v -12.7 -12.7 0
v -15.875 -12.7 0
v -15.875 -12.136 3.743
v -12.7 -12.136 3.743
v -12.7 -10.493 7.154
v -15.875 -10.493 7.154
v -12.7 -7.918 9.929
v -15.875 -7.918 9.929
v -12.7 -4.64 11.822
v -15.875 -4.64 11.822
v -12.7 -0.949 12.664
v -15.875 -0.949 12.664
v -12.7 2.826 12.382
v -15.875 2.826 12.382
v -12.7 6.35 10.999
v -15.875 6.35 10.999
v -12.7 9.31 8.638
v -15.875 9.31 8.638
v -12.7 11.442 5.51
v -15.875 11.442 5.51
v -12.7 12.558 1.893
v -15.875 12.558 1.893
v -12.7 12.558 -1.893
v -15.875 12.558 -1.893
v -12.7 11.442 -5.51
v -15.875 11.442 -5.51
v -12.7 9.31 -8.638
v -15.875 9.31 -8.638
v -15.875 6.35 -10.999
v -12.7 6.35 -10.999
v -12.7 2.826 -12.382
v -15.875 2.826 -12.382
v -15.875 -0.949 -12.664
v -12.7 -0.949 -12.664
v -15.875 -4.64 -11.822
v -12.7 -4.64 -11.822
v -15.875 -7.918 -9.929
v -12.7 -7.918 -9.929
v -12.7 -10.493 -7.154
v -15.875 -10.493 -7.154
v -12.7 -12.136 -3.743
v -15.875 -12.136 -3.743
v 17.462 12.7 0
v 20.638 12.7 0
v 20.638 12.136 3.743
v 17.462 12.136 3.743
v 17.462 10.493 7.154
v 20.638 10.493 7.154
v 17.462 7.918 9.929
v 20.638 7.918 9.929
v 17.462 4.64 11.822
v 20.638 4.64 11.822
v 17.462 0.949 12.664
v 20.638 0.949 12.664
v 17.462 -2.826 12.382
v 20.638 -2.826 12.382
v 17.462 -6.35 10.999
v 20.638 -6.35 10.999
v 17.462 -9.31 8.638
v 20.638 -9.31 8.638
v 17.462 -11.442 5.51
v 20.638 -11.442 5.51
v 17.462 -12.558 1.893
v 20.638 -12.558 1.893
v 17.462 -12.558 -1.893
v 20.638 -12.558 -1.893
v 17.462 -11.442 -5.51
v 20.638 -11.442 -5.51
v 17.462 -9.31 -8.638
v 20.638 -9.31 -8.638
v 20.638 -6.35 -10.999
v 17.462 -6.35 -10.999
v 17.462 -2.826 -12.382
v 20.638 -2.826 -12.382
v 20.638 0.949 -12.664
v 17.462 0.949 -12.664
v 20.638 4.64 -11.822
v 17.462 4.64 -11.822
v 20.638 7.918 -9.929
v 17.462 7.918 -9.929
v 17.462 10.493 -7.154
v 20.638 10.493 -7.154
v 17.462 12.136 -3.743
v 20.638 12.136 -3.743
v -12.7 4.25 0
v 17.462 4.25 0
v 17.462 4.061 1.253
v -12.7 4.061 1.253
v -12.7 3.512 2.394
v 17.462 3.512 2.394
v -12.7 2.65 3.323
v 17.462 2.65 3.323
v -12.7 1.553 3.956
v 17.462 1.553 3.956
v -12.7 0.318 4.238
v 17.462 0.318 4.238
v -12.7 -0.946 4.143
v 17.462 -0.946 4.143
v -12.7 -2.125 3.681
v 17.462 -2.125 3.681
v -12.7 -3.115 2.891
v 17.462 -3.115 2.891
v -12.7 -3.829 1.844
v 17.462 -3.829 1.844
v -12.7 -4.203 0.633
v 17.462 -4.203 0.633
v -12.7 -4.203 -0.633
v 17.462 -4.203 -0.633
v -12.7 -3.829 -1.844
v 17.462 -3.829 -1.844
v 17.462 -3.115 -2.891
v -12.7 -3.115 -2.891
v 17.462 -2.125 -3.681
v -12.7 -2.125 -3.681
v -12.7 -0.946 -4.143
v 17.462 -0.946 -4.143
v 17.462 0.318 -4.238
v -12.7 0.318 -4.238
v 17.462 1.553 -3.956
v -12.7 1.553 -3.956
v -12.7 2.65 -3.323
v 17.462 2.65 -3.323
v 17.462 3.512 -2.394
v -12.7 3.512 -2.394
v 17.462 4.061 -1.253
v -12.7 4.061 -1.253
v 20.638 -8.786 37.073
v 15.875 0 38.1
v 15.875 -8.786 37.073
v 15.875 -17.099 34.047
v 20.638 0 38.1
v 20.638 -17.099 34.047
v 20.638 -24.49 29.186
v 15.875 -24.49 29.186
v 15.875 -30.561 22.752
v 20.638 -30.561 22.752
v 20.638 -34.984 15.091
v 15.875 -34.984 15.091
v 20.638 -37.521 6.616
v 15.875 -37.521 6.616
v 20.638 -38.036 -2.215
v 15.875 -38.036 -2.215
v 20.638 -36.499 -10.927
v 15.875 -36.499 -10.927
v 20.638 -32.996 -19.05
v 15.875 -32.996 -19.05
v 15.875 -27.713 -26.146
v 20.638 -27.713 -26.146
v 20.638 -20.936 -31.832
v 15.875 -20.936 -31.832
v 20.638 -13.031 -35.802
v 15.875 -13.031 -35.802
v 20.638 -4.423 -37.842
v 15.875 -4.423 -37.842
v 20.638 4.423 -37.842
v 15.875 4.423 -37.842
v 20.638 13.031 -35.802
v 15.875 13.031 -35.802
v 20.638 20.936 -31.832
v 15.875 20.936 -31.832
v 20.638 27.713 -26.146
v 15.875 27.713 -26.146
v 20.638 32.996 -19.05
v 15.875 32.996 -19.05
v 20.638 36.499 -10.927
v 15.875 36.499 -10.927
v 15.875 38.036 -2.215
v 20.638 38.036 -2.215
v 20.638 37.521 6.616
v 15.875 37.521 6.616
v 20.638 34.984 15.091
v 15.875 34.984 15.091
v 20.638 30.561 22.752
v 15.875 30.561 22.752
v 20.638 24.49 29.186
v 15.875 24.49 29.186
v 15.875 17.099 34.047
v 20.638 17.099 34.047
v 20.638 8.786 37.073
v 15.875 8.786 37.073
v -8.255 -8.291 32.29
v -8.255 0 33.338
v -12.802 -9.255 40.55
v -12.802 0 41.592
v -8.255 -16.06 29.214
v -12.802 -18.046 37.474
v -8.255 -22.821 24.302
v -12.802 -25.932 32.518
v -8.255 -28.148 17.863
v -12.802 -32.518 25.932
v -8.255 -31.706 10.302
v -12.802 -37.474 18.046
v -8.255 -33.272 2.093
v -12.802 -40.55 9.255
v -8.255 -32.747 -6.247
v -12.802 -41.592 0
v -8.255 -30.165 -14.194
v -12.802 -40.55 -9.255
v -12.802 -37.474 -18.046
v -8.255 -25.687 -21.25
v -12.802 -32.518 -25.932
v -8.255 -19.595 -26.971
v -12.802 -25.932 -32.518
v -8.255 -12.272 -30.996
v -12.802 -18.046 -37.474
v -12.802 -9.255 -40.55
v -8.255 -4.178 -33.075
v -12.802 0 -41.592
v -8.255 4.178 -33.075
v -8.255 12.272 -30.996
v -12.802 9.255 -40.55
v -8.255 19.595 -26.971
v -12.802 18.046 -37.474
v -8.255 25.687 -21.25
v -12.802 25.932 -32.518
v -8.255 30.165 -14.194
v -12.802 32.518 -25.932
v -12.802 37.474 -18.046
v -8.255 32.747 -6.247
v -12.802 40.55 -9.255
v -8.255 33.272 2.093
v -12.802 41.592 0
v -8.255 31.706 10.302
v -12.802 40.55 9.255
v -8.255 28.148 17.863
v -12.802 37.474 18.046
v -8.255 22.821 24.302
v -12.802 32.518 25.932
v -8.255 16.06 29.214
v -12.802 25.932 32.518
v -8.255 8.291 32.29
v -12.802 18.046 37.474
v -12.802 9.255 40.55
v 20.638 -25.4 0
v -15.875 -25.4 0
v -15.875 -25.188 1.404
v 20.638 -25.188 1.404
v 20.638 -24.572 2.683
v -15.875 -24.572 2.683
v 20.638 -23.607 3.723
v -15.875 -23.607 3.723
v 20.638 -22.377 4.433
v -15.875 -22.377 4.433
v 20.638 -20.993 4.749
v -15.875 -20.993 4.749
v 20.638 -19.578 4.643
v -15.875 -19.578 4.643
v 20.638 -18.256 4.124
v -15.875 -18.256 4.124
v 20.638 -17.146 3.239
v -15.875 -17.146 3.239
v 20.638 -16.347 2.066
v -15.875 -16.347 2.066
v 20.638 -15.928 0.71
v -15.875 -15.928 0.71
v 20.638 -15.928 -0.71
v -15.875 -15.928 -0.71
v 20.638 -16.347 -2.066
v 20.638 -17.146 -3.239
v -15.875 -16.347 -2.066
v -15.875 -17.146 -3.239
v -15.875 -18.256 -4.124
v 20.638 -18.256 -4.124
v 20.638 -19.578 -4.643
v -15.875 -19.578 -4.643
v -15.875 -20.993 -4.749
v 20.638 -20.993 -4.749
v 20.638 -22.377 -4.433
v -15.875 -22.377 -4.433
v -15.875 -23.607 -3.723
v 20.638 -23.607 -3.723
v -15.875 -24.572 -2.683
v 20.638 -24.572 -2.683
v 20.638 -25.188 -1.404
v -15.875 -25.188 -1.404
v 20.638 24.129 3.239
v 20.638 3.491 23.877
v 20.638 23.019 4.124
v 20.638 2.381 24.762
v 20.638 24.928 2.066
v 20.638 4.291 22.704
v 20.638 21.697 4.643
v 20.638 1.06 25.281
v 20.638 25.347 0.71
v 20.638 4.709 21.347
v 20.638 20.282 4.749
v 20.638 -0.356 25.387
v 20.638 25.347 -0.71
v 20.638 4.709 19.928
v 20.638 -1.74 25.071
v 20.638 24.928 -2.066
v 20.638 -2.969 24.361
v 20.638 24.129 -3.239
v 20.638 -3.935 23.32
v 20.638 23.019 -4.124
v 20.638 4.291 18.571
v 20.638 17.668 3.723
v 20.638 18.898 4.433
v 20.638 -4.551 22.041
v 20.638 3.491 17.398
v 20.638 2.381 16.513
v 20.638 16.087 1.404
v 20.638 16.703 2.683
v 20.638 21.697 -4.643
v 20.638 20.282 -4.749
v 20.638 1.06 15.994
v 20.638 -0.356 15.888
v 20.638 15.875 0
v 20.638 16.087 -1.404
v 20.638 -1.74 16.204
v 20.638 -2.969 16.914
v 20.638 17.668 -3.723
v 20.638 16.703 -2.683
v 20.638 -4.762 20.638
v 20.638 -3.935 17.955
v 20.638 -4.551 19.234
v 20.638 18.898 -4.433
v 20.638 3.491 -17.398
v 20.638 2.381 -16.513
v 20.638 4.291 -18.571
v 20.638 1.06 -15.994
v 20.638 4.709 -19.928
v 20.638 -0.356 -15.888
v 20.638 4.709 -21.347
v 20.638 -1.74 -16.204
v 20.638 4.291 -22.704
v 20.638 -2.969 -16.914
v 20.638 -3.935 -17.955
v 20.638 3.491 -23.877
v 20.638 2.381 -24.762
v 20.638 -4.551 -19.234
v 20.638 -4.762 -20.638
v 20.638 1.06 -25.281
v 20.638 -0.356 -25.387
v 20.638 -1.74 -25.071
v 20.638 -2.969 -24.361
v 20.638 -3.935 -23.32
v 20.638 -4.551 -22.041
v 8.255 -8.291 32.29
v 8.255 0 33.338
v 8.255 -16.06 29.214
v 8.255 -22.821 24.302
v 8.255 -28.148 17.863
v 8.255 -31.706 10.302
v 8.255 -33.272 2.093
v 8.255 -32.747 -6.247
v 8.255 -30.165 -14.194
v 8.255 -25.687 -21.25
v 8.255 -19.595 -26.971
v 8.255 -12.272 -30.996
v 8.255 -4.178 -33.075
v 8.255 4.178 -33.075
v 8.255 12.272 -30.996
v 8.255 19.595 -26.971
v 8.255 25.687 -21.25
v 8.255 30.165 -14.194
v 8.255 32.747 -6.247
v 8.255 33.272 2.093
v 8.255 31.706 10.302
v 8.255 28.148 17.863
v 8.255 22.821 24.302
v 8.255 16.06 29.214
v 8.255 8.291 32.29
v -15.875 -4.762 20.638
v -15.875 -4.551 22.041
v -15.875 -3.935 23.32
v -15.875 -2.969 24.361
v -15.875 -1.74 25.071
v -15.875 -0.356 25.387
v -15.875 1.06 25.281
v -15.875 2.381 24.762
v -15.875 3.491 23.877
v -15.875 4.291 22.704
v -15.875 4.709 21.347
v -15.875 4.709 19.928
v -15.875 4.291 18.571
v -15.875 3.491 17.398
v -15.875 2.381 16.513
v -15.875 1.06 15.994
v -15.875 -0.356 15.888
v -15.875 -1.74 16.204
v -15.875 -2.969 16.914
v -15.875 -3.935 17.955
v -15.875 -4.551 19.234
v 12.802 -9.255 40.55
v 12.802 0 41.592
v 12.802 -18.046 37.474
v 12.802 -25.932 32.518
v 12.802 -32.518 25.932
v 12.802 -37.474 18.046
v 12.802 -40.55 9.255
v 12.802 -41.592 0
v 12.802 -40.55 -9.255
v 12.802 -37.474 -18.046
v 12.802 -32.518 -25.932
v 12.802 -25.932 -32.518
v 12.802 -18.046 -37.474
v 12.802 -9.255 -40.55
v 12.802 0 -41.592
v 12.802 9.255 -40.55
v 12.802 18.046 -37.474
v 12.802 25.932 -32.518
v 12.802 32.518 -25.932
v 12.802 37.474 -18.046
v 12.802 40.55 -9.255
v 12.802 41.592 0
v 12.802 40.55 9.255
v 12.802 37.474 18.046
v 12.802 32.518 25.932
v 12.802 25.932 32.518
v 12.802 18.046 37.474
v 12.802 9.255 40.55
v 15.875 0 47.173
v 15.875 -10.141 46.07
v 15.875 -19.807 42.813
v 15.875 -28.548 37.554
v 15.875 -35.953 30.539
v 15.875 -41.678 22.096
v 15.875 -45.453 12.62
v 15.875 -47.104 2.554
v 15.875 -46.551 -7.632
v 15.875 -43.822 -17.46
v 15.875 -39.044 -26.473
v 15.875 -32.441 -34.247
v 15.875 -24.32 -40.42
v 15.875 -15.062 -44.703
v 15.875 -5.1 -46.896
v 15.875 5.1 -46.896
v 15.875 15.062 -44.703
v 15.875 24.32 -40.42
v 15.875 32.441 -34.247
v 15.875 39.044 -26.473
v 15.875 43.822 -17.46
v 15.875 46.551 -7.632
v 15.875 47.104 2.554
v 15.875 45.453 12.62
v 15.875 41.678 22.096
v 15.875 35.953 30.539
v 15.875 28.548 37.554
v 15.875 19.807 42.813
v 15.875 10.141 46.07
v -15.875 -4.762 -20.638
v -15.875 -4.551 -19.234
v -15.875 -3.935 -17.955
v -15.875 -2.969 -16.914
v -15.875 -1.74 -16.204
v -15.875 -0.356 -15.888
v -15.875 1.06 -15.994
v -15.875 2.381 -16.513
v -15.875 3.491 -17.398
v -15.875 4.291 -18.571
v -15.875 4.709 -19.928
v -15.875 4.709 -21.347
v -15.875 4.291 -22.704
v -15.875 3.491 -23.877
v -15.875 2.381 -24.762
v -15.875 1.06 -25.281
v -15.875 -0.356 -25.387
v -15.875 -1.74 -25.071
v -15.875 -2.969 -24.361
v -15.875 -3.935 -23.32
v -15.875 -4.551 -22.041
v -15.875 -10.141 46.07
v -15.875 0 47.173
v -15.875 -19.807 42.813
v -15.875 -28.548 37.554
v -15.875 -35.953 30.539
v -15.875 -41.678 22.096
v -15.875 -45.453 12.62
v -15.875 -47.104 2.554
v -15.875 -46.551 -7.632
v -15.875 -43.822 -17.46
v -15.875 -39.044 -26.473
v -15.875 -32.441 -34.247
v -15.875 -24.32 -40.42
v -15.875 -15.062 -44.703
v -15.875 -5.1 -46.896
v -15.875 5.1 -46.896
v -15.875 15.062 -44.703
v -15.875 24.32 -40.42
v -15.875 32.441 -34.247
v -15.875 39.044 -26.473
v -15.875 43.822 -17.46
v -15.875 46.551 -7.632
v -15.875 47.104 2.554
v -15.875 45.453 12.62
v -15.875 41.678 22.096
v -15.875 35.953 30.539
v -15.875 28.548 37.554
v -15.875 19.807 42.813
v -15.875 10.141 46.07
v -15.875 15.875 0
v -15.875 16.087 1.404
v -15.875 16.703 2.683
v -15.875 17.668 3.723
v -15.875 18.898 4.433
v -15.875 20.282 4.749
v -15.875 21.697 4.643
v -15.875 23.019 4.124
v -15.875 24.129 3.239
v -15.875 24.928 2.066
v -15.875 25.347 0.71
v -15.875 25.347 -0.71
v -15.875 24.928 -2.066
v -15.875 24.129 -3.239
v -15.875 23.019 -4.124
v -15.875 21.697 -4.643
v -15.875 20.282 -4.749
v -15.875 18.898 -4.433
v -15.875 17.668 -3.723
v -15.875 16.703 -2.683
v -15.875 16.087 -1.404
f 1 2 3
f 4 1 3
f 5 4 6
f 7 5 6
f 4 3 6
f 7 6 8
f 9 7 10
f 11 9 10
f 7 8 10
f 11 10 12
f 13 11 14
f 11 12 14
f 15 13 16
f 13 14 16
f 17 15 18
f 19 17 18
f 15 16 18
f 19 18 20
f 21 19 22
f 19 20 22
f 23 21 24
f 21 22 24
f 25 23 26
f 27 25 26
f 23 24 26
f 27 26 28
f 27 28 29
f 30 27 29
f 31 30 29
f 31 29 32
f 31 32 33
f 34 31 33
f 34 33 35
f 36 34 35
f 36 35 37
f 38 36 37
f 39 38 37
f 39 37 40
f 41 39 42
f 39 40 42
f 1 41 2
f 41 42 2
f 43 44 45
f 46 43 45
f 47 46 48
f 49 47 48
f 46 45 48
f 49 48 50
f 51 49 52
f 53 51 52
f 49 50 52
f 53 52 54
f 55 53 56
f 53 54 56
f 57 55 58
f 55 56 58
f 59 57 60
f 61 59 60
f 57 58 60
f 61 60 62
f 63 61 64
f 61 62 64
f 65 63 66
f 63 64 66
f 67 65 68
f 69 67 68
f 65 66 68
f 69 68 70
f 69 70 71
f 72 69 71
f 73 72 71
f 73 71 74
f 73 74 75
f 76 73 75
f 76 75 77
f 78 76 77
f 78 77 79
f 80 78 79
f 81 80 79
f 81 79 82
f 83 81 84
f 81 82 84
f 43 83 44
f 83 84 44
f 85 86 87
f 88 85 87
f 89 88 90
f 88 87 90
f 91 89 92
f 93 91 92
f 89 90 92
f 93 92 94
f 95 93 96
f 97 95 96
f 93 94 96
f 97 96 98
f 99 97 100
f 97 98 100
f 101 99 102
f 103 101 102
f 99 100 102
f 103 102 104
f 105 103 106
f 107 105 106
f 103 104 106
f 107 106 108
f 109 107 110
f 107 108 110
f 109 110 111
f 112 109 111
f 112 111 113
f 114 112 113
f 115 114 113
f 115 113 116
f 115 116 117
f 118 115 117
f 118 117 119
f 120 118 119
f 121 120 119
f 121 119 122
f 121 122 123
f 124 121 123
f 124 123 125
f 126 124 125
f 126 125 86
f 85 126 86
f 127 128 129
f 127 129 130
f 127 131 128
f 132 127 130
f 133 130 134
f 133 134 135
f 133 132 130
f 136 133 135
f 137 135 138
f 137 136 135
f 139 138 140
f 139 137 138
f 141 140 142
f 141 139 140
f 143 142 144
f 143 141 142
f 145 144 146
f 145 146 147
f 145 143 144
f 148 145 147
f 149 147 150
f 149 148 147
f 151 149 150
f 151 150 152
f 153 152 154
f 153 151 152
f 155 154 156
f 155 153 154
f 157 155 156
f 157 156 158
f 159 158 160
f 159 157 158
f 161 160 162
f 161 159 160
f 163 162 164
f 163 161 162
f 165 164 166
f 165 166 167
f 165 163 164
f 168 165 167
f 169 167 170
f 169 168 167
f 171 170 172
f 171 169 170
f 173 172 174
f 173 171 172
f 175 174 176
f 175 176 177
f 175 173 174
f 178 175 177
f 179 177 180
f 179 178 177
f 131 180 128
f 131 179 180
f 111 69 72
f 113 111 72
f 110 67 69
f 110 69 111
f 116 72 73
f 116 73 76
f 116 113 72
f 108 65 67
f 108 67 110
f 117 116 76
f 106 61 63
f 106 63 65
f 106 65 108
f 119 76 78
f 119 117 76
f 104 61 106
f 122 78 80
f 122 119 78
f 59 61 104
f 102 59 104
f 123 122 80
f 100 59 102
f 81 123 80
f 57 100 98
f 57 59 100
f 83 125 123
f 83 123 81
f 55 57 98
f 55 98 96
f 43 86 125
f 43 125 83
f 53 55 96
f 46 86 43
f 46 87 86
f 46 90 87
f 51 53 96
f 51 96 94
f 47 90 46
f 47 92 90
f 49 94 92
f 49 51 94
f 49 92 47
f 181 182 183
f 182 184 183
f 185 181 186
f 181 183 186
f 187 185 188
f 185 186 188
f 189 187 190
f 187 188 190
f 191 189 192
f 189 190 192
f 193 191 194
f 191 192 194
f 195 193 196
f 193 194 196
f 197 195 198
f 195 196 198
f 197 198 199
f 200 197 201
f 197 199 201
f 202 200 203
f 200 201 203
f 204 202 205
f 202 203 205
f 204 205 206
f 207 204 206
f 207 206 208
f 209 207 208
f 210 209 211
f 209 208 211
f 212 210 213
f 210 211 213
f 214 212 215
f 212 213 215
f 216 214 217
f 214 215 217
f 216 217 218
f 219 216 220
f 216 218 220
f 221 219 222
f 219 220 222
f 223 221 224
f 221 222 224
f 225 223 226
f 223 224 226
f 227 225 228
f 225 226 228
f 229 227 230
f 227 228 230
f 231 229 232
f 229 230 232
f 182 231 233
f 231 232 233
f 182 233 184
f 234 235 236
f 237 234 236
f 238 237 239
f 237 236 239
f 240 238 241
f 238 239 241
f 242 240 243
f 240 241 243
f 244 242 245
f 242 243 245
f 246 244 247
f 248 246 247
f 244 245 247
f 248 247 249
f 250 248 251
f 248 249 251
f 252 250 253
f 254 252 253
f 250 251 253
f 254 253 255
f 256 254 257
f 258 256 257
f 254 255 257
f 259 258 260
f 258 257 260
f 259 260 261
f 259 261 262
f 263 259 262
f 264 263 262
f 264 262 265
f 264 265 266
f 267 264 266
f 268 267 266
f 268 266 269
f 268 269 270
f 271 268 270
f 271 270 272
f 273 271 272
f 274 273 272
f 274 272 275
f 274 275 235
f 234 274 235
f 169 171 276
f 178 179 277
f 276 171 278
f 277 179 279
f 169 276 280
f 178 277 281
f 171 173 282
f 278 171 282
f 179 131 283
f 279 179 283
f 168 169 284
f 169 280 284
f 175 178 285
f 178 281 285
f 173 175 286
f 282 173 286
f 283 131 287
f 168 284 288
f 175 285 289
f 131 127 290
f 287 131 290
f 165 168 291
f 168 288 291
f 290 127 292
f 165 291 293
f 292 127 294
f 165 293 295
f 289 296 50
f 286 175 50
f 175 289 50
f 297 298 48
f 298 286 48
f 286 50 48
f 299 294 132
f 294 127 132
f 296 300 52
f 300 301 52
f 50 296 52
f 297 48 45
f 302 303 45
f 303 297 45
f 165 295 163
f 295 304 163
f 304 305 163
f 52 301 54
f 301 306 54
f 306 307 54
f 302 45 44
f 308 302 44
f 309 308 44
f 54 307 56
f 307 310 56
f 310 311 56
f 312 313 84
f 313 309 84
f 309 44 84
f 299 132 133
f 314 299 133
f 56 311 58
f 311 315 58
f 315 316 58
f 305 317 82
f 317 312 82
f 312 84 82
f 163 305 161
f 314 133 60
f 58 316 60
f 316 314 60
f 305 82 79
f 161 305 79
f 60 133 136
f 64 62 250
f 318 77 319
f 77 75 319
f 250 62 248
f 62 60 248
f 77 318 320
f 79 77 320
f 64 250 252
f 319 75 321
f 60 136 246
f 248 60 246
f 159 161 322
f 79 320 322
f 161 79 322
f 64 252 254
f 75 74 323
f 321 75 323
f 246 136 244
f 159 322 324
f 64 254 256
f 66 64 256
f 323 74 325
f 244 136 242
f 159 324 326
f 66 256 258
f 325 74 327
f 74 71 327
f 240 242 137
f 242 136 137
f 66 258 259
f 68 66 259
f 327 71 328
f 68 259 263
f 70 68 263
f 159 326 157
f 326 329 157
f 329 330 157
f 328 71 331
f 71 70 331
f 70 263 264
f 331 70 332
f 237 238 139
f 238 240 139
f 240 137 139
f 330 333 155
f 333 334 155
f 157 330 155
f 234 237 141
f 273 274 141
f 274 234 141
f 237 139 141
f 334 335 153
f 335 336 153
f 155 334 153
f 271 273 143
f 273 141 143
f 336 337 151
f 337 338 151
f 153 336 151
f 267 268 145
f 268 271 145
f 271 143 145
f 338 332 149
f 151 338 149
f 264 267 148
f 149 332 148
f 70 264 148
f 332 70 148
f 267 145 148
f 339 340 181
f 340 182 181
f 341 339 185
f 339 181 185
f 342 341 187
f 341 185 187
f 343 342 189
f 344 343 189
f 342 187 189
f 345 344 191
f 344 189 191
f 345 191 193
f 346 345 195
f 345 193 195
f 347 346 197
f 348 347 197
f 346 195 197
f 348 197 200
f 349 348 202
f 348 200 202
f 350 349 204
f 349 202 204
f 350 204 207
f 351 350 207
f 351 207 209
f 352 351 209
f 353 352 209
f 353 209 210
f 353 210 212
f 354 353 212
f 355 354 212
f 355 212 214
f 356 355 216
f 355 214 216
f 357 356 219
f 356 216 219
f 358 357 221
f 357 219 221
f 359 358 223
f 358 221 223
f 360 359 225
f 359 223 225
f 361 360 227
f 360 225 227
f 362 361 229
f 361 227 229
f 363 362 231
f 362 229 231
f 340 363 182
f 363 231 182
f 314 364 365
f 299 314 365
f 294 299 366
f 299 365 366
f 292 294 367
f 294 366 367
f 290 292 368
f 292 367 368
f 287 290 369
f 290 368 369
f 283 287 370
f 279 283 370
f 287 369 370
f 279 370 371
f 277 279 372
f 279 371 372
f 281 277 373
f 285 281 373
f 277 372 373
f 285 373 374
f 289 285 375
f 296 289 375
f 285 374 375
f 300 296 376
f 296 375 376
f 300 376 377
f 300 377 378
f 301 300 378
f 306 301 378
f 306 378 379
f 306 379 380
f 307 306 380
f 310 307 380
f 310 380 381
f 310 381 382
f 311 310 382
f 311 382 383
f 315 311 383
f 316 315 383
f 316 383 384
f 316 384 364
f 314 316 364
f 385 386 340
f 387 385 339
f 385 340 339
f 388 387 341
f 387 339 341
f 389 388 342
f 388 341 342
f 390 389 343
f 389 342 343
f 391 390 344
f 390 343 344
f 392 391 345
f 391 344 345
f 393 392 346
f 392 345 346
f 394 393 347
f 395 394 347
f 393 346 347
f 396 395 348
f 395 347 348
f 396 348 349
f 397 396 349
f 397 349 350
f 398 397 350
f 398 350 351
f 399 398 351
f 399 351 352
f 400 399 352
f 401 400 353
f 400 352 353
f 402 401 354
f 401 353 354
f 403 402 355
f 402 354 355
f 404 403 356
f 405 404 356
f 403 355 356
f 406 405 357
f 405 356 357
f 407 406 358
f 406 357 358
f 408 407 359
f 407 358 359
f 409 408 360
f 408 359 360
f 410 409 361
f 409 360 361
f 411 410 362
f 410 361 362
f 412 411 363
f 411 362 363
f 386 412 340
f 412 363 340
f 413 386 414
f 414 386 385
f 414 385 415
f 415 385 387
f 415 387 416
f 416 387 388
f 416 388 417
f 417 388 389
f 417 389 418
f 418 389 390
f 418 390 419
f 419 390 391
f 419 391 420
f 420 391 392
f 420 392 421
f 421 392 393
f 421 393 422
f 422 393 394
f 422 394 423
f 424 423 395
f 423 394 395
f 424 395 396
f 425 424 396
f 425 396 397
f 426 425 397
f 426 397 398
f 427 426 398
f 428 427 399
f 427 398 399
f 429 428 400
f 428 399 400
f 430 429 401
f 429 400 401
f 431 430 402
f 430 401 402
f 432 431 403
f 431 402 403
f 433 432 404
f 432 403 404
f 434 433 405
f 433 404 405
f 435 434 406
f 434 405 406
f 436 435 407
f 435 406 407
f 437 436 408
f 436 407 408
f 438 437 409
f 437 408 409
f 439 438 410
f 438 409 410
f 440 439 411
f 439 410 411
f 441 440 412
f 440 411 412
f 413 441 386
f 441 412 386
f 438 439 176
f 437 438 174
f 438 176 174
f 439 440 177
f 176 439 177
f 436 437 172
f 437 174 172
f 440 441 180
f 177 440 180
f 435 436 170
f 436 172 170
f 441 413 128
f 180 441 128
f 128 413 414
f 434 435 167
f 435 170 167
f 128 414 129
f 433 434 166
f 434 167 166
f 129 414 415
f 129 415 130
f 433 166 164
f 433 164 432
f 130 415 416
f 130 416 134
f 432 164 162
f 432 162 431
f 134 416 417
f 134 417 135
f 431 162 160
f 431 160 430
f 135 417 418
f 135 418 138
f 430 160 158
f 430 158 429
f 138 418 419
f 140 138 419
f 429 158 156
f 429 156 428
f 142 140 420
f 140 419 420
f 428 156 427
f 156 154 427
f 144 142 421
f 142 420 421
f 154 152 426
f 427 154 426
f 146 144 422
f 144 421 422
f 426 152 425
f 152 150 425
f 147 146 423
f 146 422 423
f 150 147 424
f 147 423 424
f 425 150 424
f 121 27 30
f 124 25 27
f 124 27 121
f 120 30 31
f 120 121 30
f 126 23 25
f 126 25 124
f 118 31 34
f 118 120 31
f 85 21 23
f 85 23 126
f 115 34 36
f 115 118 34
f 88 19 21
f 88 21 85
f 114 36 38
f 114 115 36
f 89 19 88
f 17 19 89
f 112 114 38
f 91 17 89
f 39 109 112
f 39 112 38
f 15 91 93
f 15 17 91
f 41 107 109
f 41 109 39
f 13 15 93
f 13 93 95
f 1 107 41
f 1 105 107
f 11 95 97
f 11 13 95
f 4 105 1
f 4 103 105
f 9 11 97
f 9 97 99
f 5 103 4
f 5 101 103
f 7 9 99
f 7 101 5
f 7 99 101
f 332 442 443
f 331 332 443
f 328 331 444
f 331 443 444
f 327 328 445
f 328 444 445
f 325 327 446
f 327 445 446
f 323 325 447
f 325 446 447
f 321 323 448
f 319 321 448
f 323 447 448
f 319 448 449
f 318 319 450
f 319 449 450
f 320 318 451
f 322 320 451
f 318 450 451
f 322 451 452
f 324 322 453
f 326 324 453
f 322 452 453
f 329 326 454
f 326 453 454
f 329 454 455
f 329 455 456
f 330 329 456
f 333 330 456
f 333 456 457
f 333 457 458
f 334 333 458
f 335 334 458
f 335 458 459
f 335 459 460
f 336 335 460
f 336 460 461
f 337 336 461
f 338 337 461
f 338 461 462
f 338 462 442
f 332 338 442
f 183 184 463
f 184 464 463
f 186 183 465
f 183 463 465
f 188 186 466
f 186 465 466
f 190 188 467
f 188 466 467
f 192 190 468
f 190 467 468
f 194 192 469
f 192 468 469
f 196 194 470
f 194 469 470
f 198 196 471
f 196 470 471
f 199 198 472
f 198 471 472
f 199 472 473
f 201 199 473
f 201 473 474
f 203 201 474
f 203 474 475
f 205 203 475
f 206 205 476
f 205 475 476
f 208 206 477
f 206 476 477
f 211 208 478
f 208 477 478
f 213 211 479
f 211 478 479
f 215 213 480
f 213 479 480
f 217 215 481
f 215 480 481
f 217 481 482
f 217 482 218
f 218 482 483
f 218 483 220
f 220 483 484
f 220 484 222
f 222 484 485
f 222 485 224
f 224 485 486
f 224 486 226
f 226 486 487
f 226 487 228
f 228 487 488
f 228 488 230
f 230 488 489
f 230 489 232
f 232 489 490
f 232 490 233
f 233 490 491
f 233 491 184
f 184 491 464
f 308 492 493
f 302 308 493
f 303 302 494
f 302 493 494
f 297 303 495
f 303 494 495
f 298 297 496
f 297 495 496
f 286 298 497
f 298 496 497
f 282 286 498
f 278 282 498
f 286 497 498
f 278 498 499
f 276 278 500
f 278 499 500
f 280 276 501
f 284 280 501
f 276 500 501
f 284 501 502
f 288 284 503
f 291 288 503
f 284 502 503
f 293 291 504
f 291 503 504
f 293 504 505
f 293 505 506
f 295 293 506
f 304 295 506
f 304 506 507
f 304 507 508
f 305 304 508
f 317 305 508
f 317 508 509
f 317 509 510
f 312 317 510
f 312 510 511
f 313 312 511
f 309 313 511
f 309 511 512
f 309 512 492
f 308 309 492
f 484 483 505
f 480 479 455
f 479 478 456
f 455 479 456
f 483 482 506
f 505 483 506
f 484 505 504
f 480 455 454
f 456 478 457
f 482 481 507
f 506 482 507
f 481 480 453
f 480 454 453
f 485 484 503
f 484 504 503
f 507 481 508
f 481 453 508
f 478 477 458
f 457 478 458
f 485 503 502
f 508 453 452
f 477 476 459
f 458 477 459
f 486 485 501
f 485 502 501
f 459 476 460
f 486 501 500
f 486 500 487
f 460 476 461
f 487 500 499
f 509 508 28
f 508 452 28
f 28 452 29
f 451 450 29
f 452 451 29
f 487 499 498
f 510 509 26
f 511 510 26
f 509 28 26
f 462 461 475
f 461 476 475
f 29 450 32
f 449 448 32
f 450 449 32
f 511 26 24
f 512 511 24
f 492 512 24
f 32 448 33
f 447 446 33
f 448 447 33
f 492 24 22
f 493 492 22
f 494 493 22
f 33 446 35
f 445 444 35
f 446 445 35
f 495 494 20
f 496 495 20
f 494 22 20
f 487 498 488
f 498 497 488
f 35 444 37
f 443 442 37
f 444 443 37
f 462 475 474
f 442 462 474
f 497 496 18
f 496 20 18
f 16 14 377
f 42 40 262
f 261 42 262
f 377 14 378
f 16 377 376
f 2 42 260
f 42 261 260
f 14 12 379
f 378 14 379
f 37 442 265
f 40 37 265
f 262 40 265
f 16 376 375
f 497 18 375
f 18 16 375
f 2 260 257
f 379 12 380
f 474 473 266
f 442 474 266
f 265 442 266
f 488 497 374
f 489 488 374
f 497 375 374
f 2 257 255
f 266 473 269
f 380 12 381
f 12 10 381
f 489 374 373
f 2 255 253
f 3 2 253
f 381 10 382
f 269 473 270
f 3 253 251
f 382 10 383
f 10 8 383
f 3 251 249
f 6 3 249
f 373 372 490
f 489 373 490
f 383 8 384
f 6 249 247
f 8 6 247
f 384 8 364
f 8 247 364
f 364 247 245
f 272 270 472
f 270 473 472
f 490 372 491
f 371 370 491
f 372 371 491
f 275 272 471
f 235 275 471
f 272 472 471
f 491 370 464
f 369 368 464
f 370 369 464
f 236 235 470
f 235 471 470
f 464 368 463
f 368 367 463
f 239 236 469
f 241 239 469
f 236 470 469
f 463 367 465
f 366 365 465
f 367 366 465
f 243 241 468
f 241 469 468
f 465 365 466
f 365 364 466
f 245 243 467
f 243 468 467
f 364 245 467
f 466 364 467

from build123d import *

# Parameters (mm, degrees)
F0_W     = 4.7625
F0_H     = 38.1
F2_R     = 4.25
F3_DEPTH = 36.5135
F2_R_2   = 12.7
F4_DEPTH = 3.175
F5_R     = 12.7
F5_R_2   = 4.25
F6_DEPTH = 3.175
F5_R_3   = 4.7625
F7_DEPTH = 36.5135


with BuildPart() as f1:
    # F0 (on Front) → F1 (revolve)
    with BuildSketch(Plane.XZ):
        with BuildLine():
            Line((-12.8016, 41.5925), (-15.875, 41.5925))
            Line((-15.875, 41.5925), (-15.875, 0))
            Line((-15.875, 0), (-4.7625, 0))
            ThreePointArc((-4.7625, 0), (0, 4.7625), (4.7625, 0))
            Line((4.7625, 0), (15.875, 0))
            Line((15.875, 0), (15.875, 38.1))
            Line((15.875, 38.1), (15.875, 41.5925))
            Line((15.875, 41.5925), (12.8016, 41.5925))
            Line((12.8016, 41.5925), (8.255, 33.3375))
            Line((8.255, 33.3375), (-8.255, 33.3375))
            Line((-8.255, 33.3375), (-12.8016, 41.5925))
        make_face()
        with Locations((18.25625, 19.05)):
            Rectangle(F0_W, F0_H)
        with BuildLine():
            ThreePointArc((4.7625, 0), (0, 4.7625), (-4.7625, 0))
            Line((-4.7625, 0), (4.7625, 0))
        make_face()
        Polygon((-15.875, 47.1726955307), (-15.875, 41.5925), (-12.8016, 41.5925), align=None)
        Polygon((15.875, 47.1726955307), (12.8016, 41.5925), (15.875, 41.5925), align=None)
    revolve(axis=Axis((2.38125, 0, 0), (1, 0, 0)))

    # F2 (on face) → F3 (cut, through all)
    with BuildSketch(Plane.YZ.offset(20.6375)):
        Circle(F2_R)
    extrude(amount=-F3_DEPTH, mode=Mode.SUBTRACT)

    # F2 (on face) → F4 (cut)
    with BuildSketch(Plane.YZ.offset(20.6375)):
        Circle(F2_R_2)
        Circle(F2_R, mode=Mode.SUBTRACT)
    extrude(amount=-F4_DEPTH, mode=Mode.SUBTRACT)

    # F5 (on face) → F6 (cut)
    with BuildSketch(Plane(origin=(-15.875, 0, 0), x_dir=(0, -1, 0), z_dir=(-1, 0, 0))):
        Circle(F5_R)
        Circle(F5_R_2, mode=Mode.SUBTRACT)
        Circle(F5_R_2)
    extrude(amount=-F6_DEPTH, mode=Mode.SUBTRACT)

    # F5 (on face) → F7 (cut, through all)
    with BuildSketch(Plane(origin=(-15.875, 0, 0), x_dir=(0, -1, 0), z_dir=(-1, 0, 0))):
        with Locations((0, 20.6375)):
            Circle(F5_R_3)
        with Locations((20.6375, 0)):
            Circle(F5_R_3)
        with Locations((0, -20.6375)):
            Circle(F5_R_3)
        with Locations((-20.6375, 0)):
            Circle(F5_R_3)
    extrude(amount=-F7_DEPTH, mode=Mode.SUBTRACT)


solid = f1.part
